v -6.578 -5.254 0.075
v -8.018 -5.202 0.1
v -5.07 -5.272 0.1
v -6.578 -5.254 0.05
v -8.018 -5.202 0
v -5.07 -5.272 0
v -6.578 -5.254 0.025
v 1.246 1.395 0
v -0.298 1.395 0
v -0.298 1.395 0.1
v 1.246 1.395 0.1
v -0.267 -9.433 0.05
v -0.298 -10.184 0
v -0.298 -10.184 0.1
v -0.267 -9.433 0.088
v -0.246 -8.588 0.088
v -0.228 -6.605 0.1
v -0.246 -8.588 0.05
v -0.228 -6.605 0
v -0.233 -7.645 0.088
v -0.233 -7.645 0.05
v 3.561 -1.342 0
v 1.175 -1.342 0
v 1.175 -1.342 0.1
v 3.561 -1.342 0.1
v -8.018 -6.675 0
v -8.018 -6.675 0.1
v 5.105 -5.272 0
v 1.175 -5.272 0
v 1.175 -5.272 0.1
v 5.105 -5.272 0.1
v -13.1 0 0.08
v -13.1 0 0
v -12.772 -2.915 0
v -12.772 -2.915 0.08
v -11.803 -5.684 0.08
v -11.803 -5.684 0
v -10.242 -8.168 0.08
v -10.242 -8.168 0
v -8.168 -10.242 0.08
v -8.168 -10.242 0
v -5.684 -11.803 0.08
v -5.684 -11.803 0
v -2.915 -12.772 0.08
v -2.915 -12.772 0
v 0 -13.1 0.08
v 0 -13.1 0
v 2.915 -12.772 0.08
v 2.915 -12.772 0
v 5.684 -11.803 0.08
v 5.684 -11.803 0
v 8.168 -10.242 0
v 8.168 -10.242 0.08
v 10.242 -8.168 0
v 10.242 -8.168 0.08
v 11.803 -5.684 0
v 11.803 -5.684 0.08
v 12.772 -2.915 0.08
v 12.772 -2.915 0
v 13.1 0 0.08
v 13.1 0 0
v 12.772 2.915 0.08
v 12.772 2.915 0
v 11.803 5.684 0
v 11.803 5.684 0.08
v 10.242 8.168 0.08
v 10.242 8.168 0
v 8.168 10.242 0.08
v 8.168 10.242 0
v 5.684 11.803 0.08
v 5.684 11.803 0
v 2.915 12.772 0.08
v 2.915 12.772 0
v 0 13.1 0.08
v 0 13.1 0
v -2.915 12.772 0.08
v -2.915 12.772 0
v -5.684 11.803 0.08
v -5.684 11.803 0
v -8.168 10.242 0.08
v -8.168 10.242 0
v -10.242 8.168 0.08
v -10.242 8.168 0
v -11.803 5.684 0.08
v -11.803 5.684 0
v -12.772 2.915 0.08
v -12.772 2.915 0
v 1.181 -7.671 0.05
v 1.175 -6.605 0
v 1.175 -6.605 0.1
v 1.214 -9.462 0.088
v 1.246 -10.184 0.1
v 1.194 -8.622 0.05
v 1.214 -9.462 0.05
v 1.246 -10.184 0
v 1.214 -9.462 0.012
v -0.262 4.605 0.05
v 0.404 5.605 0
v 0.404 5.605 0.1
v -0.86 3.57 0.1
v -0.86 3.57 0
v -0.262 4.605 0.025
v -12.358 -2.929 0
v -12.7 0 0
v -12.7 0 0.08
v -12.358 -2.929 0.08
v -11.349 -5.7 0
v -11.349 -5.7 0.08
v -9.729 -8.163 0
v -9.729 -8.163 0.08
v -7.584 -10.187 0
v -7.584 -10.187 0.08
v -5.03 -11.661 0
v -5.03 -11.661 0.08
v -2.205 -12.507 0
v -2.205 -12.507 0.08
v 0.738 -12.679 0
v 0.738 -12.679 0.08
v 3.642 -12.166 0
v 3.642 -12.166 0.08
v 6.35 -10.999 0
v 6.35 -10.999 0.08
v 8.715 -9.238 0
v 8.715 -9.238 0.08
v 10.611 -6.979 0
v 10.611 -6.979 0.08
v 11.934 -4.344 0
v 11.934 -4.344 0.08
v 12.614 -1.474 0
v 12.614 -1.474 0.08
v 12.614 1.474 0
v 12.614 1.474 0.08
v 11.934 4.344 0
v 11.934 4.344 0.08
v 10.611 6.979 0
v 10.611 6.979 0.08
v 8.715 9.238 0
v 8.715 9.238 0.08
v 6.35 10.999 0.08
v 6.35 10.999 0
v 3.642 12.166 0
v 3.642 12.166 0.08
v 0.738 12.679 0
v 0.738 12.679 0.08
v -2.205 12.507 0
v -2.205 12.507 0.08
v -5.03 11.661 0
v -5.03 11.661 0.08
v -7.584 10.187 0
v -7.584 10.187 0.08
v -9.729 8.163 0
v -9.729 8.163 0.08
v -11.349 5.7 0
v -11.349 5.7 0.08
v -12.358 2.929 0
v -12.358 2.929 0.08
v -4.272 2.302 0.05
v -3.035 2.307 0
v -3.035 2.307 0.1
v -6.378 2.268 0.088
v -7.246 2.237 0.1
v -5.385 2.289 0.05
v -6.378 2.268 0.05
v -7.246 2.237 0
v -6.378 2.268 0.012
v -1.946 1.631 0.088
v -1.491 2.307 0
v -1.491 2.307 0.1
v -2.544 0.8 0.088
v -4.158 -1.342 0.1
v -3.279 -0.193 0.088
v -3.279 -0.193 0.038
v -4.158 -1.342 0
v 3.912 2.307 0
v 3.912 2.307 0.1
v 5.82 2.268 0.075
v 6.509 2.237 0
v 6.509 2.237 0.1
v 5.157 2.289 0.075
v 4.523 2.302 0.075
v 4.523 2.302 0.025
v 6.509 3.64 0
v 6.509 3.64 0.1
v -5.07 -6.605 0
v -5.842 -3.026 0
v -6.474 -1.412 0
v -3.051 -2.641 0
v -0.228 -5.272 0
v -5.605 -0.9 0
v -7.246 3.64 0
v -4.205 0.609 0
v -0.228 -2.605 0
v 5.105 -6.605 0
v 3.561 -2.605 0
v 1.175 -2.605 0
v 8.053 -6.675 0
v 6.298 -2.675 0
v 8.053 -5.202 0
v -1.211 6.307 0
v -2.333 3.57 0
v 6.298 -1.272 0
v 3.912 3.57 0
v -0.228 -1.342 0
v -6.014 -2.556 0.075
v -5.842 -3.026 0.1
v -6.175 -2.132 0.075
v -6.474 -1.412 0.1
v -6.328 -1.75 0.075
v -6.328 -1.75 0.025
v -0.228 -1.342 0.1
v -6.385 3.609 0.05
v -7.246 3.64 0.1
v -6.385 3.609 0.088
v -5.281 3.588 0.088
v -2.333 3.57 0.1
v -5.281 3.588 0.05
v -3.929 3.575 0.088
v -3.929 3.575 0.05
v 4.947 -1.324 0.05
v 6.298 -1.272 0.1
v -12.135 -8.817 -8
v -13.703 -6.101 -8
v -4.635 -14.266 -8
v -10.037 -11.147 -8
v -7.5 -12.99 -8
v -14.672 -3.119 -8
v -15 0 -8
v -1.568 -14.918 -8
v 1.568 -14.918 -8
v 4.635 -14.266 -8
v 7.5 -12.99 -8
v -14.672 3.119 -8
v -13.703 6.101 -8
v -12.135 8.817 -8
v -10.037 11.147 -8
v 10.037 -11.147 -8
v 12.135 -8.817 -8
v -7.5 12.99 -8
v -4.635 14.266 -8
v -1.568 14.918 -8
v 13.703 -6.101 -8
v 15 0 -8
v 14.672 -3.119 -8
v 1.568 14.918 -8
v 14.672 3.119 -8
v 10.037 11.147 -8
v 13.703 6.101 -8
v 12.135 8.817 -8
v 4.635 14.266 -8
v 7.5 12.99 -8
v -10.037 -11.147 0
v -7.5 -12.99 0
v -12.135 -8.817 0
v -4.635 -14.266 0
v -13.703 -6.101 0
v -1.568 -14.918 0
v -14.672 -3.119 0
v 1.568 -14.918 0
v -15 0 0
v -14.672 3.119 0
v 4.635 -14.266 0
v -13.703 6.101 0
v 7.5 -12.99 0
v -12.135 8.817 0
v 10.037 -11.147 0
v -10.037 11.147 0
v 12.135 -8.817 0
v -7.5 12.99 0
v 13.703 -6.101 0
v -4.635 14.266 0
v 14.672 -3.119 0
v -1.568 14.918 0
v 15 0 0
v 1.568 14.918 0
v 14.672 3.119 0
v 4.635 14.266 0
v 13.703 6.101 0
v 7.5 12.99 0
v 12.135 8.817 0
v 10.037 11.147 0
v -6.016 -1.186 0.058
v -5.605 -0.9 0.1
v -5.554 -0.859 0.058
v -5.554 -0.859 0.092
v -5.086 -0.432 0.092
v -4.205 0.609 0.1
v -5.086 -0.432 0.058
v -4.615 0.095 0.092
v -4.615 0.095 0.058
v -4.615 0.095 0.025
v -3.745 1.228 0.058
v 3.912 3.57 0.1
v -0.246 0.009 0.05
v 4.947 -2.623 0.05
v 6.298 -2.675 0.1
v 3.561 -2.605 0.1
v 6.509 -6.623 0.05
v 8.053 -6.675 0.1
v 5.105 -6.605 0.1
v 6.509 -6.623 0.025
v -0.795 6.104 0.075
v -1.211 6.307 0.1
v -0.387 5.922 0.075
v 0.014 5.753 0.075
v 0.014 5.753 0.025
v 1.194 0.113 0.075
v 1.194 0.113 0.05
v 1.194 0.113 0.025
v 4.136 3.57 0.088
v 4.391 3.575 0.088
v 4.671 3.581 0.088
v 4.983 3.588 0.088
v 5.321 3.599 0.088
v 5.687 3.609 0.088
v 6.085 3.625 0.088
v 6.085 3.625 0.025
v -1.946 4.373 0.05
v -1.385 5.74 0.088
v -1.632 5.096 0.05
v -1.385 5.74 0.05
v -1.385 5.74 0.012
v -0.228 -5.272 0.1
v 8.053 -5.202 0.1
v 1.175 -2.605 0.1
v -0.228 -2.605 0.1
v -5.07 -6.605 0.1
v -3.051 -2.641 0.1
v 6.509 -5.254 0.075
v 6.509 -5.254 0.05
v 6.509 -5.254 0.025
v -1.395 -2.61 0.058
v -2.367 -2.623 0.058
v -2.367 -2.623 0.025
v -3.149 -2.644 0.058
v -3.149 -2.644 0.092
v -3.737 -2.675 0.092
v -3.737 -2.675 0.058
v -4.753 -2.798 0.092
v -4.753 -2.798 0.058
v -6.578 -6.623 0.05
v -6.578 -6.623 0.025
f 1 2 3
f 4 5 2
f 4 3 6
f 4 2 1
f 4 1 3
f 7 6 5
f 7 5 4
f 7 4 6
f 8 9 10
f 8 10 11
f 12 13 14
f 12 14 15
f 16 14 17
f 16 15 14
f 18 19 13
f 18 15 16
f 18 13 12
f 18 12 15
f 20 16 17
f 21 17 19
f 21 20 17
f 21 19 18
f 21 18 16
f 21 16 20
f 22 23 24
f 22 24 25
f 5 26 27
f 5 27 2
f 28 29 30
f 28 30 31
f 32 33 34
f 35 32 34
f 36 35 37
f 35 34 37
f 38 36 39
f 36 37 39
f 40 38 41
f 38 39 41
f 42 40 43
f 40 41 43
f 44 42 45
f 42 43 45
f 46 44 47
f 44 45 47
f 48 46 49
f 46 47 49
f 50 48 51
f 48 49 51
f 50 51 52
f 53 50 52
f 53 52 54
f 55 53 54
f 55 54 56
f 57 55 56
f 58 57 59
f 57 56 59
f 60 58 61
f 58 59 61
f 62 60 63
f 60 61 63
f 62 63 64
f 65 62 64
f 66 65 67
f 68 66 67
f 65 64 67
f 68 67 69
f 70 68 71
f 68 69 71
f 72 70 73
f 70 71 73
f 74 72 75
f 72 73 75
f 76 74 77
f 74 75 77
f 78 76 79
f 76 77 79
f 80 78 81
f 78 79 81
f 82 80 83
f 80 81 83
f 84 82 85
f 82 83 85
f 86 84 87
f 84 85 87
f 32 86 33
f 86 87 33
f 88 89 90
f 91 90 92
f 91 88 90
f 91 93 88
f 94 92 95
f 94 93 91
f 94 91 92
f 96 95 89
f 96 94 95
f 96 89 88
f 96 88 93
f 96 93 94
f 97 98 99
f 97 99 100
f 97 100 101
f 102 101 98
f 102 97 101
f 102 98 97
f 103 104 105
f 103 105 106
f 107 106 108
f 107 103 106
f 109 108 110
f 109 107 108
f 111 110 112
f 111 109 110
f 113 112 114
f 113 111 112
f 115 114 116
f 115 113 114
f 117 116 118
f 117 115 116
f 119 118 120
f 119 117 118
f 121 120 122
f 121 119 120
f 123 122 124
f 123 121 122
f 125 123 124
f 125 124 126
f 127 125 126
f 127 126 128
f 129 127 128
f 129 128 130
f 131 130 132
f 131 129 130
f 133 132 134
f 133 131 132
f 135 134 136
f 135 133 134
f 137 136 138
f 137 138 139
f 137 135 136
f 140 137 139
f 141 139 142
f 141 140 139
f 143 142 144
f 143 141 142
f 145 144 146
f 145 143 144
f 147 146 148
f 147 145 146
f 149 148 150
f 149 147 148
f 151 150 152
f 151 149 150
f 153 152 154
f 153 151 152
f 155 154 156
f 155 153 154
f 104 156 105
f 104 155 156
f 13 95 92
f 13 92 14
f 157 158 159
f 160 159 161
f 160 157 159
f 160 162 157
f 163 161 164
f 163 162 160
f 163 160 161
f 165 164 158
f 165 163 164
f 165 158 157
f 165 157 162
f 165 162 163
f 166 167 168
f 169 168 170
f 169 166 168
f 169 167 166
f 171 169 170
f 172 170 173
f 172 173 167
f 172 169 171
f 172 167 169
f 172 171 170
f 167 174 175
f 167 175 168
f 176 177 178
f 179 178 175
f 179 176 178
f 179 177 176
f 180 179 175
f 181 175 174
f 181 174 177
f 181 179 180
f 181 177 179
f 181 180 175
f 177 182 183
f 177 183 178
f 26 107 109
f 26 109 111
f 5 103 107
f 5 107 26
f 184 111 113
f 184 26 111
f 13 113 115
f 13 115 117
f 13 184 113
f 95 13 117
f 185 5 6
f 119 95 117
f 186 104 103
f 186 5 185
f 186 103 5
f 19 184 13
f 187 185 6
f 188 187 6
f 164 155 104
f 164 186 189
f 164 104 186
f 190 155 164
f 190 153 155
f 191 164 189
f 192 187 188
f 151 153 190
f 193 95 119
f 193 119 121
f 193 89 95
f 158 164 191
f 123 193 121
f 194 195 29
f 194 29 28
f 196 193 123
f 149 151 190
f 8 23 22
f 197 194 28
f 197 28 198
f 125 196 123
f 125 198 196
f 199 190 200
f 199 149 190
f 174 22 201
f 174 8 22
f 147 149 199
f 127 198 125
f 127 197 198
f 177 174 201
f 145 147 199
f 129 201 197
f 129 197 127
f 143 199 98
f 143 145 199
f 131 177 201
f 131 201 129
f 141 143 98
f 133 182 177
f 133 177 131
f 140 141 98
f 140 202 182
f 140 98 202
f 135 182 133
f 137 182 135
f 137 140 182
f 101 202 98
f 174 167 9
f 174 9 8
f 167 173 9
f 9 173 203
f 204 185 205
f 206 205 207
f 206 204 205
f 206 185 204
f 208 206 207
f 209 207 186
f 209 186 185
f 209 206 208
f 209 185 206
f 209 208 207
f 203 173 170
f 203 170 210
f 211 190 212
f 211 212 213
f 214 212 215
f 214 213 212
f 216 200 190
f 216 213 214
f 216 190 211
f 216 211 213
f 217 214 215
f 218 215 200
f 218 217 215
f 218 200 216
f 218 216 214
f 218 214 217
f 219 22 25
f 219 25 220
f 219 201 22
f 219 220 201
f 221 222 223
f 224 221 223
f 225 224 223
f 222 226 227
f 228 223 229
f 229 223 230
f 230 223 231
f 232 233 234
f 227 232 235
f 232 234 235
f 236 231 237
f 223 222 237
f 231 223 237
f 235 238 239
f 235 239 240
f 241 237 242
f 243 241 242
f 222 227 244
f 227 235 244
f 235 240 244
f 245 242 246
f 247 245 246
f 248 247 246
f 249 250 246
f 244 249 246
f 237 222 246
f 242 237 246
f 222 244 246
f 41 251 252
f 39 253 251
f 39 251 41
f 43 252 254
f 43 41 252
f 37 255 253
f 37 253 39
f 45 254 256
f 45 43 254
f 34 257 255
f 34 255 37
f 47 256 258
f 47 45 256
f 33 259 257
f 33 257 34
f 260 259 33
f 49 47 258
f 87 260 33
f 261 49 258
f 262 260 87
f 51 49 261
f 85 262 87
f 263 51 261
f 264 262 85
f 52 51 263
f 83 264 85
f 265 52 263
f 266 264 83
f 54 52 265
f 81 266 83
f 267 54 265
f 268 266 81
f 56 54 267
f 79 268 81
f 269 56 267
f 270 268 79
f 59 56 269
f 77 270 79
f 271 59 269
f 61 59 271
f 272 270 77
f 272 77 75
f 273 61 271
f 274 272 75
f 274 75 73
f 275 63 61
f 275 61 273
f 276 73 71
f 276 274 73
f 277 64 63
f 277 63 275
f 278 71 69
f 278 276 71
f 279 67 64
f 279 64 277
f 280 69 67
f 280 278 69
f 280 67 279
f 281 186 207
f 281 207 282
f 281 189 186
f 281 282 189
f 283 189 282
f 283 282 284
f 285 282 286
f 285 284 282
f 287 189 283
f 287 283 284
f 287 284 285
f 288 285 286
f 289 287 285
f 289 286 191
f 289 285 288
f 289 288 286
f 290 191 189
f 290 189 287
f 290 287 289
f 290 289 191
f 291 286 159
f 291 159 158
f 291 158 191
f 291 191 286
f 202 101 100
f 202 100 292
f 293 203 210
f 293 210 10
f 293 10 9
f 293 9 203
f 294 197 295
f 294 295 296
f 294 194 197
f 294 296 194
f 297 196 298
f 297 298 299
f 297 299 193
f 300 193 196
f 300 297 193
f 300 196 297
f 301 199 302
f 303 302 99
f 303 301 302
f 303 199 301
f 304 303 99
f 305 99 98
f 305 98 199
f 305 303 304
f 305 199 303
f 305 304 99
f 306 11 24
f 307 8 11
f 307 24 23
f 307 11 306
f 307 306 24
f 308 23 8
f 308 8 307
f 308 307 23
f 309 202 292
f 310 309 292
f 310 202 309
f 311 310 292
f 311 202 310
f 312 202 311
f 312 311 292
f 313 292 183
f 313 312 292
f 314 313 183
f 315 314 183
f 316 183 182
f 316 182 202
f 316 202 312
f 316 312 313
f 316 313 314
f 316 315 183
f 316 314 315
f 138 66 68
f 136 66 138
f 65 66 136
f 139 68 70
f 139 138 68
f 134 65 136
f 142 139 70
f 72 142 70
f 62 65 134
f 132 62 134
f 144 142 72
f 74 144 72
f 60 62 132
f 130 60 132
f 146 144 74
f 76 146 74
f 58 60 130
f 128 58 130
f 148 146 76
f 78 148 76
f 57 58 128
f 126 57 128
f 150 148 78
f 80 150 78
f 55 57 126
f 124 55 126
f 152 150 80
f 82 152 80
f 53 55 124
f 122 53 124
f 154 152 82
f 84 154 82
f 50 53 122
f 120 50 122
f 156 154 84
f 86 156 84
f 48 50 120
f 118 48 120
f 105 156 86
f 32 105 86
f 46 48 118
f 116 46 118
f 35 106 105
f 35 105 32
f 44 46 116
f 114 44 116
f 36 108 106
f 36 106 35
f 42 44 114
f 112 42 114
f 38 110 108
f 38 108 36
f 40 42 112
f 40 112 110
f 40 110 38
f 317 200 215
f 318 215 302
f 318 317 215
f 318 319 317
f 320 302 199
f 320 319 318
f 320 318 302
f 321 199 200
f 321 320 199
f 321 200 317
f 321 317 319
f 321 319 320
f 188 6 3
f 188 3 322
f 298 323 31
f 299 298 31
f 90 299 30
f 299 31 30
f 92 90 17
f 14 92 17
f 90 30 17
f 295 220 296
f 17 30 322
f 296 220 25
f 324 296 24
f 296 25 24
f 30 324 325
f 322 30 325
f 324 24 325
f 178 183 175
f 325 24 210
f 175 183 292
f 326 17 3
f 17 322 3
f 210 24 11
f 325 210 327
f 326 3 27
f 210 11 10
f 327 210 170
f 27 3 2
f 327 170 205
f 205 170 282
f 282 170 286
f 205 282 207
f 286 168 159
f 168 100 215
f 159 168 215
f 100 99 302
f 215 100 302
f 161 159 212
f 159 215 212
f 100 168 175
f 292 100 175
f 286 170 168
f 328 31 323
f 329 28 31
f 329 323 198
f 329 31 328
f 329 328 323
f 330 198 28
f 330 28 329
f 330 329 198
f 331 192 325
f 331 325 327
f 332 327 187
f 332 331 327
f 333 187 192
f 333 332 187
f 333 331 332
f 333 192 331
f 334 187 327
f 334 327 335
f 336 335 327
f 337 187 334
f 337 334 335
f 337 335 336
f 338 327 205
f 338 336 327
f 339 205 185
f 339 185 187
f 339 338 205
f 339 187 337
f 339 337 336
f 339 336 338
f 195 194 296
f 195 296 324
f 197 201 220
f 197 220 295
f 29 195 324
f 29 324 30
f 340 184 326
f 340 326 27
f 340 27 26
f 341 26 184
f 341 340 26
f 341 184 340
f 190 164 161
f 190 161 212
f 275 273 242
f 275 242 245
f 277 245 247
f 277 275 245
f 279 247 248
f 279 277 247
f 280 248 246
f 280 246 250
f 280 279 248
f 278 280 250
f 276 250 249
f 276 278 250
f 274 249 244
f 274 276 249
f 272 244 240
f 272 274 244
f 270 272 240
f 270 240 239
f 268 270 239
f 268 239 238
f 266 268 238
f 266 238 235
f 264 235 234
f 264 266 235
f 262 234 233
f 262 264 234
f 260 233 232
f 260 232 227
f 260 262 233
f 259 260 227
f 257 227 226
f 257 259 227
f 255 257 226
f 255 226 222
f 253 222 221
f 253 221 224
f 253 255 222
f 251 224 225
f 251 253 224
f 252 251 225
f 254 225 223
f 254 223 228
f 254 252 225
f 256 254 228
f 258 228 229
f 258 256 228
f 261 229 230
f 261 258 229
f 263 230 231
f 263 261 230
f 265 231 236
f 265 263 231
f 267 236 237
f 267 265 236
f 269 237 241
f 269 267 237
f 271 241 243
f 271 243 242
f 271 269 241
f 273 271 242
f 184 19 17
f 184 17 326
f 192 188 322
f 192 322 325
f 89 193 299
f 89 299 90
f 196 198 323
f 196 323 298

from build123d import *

# Parameters (mm, degrees)
SKETCH_1_R               = 15
DIAMETER30_HEIGHT8_DEPTH = 8
CHARACTER_DEPTH          = 0.1
SKETCH_3_R               = 13.1
SKETCH_3_R_2             = 12.7
INK_RING_DEPTH           = 0.08


with BuildPart() as part:
    # 草图1 → Diameter30_Height8 (new body)
    with BuildSketch(Plane.XY):
        Circle(SKETCH_1_R)
    extrude(amount=-DIAMETER30_HEIGHT8_DEPTH)

    # 草图2 → Character_车 (add)
    with BuildSketch(Plane.XY):
        with BuildLine():
            add(Edge.make_bspline(
                [(-5.842105263, -3.026315789), (-5.898820329, -2.869331425), (-6.006873714, -2.570245254), (-6.168804206, -2.144780878), (-6.320461844, -1.762772614), (-6.42455933, -1.524652502), (-6.473684211, -1.412280702)],
                knots=[0, 0, 0, 0, 1.155372541, 2.201212519, 3.151130129, 4, 4, 4, 4], degree=3))
            add(Edge.make_bspline(
                [(-6.473684211, -1.412280702), (-6.396823444, -1.379800087), (-6.239919961, -1.313494196), (-6.010146568, -1.186156652), (-5.778564765, -1.035723149), (-5.547823353, -0.856912408), (-5.313044861, -0.657208498), (-5.079209262, -0.430138074), (-4.845963085, -0.176973346), (-4.534501394, 0.18732381), (-4.164145867, 0.656391458), (-3.748633816, 1.216101595), (-3.371664409, 1.762234908), (-3.145394749, 2.128474715), (-3.035087719, 2.307017544)],
                knots=[0, 0, 0, 0, 0.584208733, 1.192603045, 1.837360117, 2.517159342, 3.236043131, 3.995784846, 4.79889664, 5.646810753, 7.353001509, 8.984483524, 10.529928116, 12, 12, 12, 12], degree=3))
            add(Edge.make_bspline(
                [(-3.035087719, 2.307017544), (-3.246482619, 2.307526273), (-3.658883418, 2.308518731), (-4.261856974, 2.301476847), (-4.833674599, 2.297370313), (-5.375169247, 2.289752816), (-5.886281193, 2.27816959), (-6.367224064, 2.269967872), (-6.816777836, 2.252736276), (-7.106129451, 2.242011892), (-7.245614035, 2.236842105)],
                knots=[0, 0, 0, 0, 1.204686206, 2.35016811, 3.436405474, 4.463457902, 5.436294372, 6.34989698, 7.204552796, 8, 8, 8, 8], degree=3))
            Line((-7.245614035, 2.236842105), (-7.245614035, 3.640350877))
            add(Edge.make_bspline(
                [(-7.245614035, 3.640350877), (-7.112197092, 3.635099441), (-6.825465539, 3.623813374), (-6.364629063, 3.606862837), (-5.842966328, 3.598841349), (-5.259942843, 3.587169275), (-4.61534822, 3.57975231), (-3.909248078, 3.575626696), (-3.141661522, 3.568632873), (-2.609705057, 3.569648027), (-2.333333333, 3.570175439)],
                knots=[0, 0, 0, 0, 0.652233806, 1.401741091, 2.25255631, 3.200691931, 4.250322975, 5.401478114, 6.649968519, 8, 8, 8, 8], degree=3))
            add(Edge.make_bspline(
                [(-2.333333333, 3.570175439), (-2.265182445, 3.706781651), (-2.13249513, 3.972749008), (-1.948730322, 4.364802108), (-1.781805751, 4.736299128), (-1.633474827, 5.088418502), (-1.500571846, 5.419860952), (-1.385562669, 5.732537711), (-1.288604233, 6.025373857), (-1.235803724, 6.215836544), (-1.210526316, 6.307017544)],
                knots=[0, 0, 0, 0, 1.236548776, 2.407515765, 3.506966959, 4.535340541, 5.502281012, 6.399229081, 7.23365623, 8, 8, 8, 8], degree=3))
            add(Edge.make_bspline(
                [(-1.210526316, 6.307017544), (-1.072464078, 6.238250423), (-0.801072324, 6.103073492), (-0.390506761, 5.92371698), (0.006858558, 5.752049753), (0.273104458, 5.653521307), (0.403508772, 5.605263158)],
                knots=[0, 0, 0, 0, 1.050893361, 2.065762486, 3.052631741, 4, 4, 4, 4], degree=3))
            add(Edge.make_bspline(
                [(0.403508772, 5.605263158), (0.287716291, 5.440743002), (0.057094455, 5.113071117), (-0.262779106, 4.605286149), (-0.575699306, 4.095748706), (-0.765073243, 3.745229449), (-0.859649123, 3.570175439)],
                knots=[0, 0, 0, 0, 1.007065107, 2.005753766, 3.00404673, 4, 4, 4, 4], degree=3))
            Line((-0.859649123, 3.570175439), (3.912280702, 3.570175439))
            add(Edge.make_bspline(
                [(3.912280702, 3.570175439), (3.986792128, 3.569779735), (4.146229603, 3.568933021), (4.399164705, 3.576215116), (4.681635542, 3.580205028), (4.991801347, 3.588183635), (5.330489118, 3.599673551), (5.697948203, 3.608156571), (6.093748619, 3.625727153), (6.367546823, 3.635374682), (6.50877193, 3.640350877)],
                knots=[0, 0, 0, 0, 0.688397439, 1.473013676, 2.337661006, 3.298515698, 4.339608953, 5.468714639, 6.694363069, 8, 8, 8, 8], degree=3))
            Line((6.50877193, 3.640350877), (6.50877193, 2.236842105))
            add(Edge.make_bspline(
                [(6.50877193, 2.236842105), (6.279214943, 2.247975922), (5.82888106, 2.269817709), (5.1668562, 2.289395513), (4.530922728, 2.303382911), (4.115883288, 2.305821342), (3.912280702, 2.307017544)],
                knots=[0, 0, 0, 0, 1.061662981, 2.082719505, 3.05945501, 4, 4, 4, 4], degree=3))
            Line((3.912280702, 2.307017544), (-1.49122807, 2.307017544))
            add(Edge.make_bspline(
                [(-1.49122807, 2.307017544), (-1.56117399, 2.201167925), (-1.710872673, 1.974627926), (-1.95506101, 1.616085811), (-2.235185889, 1.218787258), (-2.555254083, 0.784910796), (-2.903437302, 0.30729052), (-3.289360757, -0.207943656), (-3.711097719, -0.76191269), (-4.005224498, -1.143853854), (-4.157894737, -1.342105263)],
                knots=[0, 0, 0, 0, 0.673545103, 1.441525336, 2.302896076, 3.254132591, 4.303779702, 5.440759354, 6.671593656, 8, 8, 8, 8], degree=3))
            Line((-4.157894737, -1.342105263), (-0.228070175, -1.342105263))
            add(Edge.make_bspline(
                [(-0.228070175, -1.342105263), (-0.231461537, -0.891528138), (-0.238331174, 0.021173694), (-0.278106388, 0.933036802), (-0.298245614, 1.394736842)],
                knots=[0, 0, 0, 0, 0.987347913, 2, 2, 2, 2], degree=3))
            Line((-0.298245614, 1.394736842), (1.245614035, 1.394736842))
            add(Edge.make_bspline(
                [(1.245614035, 1.394736842), (1.234342441, 1.188579897), (1.211003525, 0.761712205), (1.192285381, 0.099612341), (1.178632375, -0.606505386), (1.176525709, -1.091718406), (1.175438596, -1.342105263)],
                knots=[0, 0, 0, 0, 0.904818853, 1.873514066, 2.902659025, 4, 4, 4, 4], degree=3))
            Line((1.175438596, -1.342105263), (3.561403509, -1.342105263))
            add(Edge.make_bspline(
                [(3.561403509, -1.342105263), (4.023251472, -1.338996907), (4.935977079, -1.332854028), (5.847809296, -1.292074512), (6.298245614, -1.271929825)],
                knots=[0, 0, 0, 0, 1.012019295, 2, 2, 2, 2], degree=3))
            Line((6.298245614, -1.271929825), (6.298245614, -2.675438596))
            add(Edge.make_bspline(
                [(6.298245614, -2.675438596), (5.847809296, -2.655293909), (4.935977079, -2.614514393), (4.023251472, -2.608371514), (3.561403509, -2.605263158)],
                knots=[0, 0, 0, 0, 0.987980705, 2, 2, 2, 2], degree=3))
            Line((3.561403509, -2.605263158), (1.175438596, -2.605263158))
            Line((1.175438596, -2.605263158), (1.175438596, -5.271929825))
            Line((1.175438596, -5.271929825), (5.105263158, -5.271929825))
            add(Edge.make_bspline(
                [(5.105263158, -5.271929825), (5.333122844, -5.270715306), (5.801003783, -5.268221447), (6.520106526, -5.254311899), (7.274811493, -5.234595053), (7.789282241, -5.212873368), (8.052631579, -5.201754386)],
                knots=[0, 0, 0, 0, 0.927389459, 1.904276523, 2.92723271, 4, 4, 4, 4], degree=3))
            Line((8.052631579, -5.201754386), (8.052631579, -6.675438596))
            add(Edge.make_bspline(
                [(8.052631579, -6.675438596), (7.789282241, -6.664319614), (7.274811493, -6.64259793), (6.520106526, -6.622881083), (5.801003783, -6.608971535), (5.333122844, -6.606477676), (5.105263158, -6.605263158)],
                knots=[0, 0, 0, 0, 1.07276729, 2.095723477, 3.072610541, 4, 4, 4, 4], degree=3))
            Line((5.105263158, -6.605263158), (1.175438596, -6.605263158))
            add(Edge.make_bspline(
                [(1.175438596, -6.605263158), (1.17492319, -6.788068469), (1.173921664, -7.143291287), (1.180988322, -7.662224869), (1.185055025, -8.151741366), (1.192680502, -8.613534144), (1.204276819, -9.04666503), (1.212388046, -9.451393023), (1.229724118, -9.827285169), (1.240445713, -10.06811771), (1.245614035, -10.184210526)],
                knots=[0, 0, 0, 0, 1.225493371, 2.381348807, 3.479127077, 4.507295234, 5.477513674, 6.383863443, 7.220944797, 8, 8, 8, 8], degree=3))
            Line((1.245614035, -10.184210526), (-0.298245614, -10.184210526))
            add(Edge.make_bspline(
                [(-0.298245614, -10.184210526), (-0.293088467, -10.062919018), (-0.28244323, -9.812552555), (-0.26517016, -9.425394066), (-0.256955584, -9.014609066), (-0.245308677, -8.579745809), (-0.237743343, -8.120551737), (-0.233625145, -7.637100266), (-0.226569426, -7.129429714), (-0.227561666, -6.782870303), (-0.228070175, -6.605263158)],
                knots=[0, 0, 0, 0, 0.813876, 1.679979569, 2.597948426, 3.568174058, 4.596349836, 5.676713029, 6.809345956, 8, 8, 8, 8], degree=3))
            Line((-0.228070175, -6.605263158), (-5.070175439, -6.605263158))
            add(Edge.make_bspline(
                [(-5.070175439, -6.605263158), (-5.324893201, -6.606388994), (-5.827429759, -6.608610173), (-6.573394245, -6.622429105), (-7.301292576, -6.641441143), (-7.781058, -6.664213602), (-8.01754386, -6.675438596)],
                knots=[0, 0, 0, 0, 1.036669794, 2.04526165, 3.036470834, 4, 4, 4, 4], degree=3))
            Line((-8.01754386, -6.675438596), (-8.01754386, -5.201754386))
            add(Edge.make_bspline(
                [(-8.01754386, -5.201754386), (-7.781058, -5.212979381), (-7.301292576, -5.235751839), (-6.573394245, -5.254763877), (-5.827429759, -5.268582809), (-5.324893201, -5.270803988), (-5.070175439, -5.271929825)],
                knots=[0, 0, 0, 0, 0.963529166, 1.95473835, 2.963330206, 4, 4, 4, 4], degree=3))
            Line((-5.070175439, -5.271929825), (-0.228070175, -5.271929825))
            Line((-0.228070175, -5.271929825), (-0.228070175, -2.605263158))
            add(Edge.make_bspline(
                [(-0.228070175, -2.605263158), (-0.430801667, -2.604732204), (-0.819811605, -2.603713387), (-1.378600845, -2.610674903), (-1.888907343, -2.614839935), (-2.351576194, -2.622216615), (-2.76650508, -2.633903903), (-3.133156573, -2.641670696), (-3.450969213, -2.659258343), (-3.813777921, -2.677582124), (-4.243119388, -2.723022723), (-4.761241386, -2.794248367), (-5.296964879, -2.896480162), (-5.65789017, -2.982441435), (-5.842105263, -3.026315789)],
                knots=[0, 0, 0, 0, 1.292465027, 2.480037691, 3.562671594, 4.545968376, 5.429981271, 6.209087619, 6.883751335, 7.459135407, 8.52479941, 9.634773871, 10.792796285, 12, 12, 12, 12], degree=3))
        make_face()
    extrude(amount=CHARACTER_DEPTH)

    # 草图3 → Ink_ring (add)
    with BuildSketch(Plane.XY):
        with Locations(Location((0, 0, 0), (0, 0, 180))):
            Circle(SKETCH_3_R)
        with Locations(Location((0, 0, 0), (0, 0, 180))):
            Circle(SKETCH_3_R_2, mode=Mode.SUBTRACT)
    extrude(amount=INK_RING_DEPTH)


solid = part.part
